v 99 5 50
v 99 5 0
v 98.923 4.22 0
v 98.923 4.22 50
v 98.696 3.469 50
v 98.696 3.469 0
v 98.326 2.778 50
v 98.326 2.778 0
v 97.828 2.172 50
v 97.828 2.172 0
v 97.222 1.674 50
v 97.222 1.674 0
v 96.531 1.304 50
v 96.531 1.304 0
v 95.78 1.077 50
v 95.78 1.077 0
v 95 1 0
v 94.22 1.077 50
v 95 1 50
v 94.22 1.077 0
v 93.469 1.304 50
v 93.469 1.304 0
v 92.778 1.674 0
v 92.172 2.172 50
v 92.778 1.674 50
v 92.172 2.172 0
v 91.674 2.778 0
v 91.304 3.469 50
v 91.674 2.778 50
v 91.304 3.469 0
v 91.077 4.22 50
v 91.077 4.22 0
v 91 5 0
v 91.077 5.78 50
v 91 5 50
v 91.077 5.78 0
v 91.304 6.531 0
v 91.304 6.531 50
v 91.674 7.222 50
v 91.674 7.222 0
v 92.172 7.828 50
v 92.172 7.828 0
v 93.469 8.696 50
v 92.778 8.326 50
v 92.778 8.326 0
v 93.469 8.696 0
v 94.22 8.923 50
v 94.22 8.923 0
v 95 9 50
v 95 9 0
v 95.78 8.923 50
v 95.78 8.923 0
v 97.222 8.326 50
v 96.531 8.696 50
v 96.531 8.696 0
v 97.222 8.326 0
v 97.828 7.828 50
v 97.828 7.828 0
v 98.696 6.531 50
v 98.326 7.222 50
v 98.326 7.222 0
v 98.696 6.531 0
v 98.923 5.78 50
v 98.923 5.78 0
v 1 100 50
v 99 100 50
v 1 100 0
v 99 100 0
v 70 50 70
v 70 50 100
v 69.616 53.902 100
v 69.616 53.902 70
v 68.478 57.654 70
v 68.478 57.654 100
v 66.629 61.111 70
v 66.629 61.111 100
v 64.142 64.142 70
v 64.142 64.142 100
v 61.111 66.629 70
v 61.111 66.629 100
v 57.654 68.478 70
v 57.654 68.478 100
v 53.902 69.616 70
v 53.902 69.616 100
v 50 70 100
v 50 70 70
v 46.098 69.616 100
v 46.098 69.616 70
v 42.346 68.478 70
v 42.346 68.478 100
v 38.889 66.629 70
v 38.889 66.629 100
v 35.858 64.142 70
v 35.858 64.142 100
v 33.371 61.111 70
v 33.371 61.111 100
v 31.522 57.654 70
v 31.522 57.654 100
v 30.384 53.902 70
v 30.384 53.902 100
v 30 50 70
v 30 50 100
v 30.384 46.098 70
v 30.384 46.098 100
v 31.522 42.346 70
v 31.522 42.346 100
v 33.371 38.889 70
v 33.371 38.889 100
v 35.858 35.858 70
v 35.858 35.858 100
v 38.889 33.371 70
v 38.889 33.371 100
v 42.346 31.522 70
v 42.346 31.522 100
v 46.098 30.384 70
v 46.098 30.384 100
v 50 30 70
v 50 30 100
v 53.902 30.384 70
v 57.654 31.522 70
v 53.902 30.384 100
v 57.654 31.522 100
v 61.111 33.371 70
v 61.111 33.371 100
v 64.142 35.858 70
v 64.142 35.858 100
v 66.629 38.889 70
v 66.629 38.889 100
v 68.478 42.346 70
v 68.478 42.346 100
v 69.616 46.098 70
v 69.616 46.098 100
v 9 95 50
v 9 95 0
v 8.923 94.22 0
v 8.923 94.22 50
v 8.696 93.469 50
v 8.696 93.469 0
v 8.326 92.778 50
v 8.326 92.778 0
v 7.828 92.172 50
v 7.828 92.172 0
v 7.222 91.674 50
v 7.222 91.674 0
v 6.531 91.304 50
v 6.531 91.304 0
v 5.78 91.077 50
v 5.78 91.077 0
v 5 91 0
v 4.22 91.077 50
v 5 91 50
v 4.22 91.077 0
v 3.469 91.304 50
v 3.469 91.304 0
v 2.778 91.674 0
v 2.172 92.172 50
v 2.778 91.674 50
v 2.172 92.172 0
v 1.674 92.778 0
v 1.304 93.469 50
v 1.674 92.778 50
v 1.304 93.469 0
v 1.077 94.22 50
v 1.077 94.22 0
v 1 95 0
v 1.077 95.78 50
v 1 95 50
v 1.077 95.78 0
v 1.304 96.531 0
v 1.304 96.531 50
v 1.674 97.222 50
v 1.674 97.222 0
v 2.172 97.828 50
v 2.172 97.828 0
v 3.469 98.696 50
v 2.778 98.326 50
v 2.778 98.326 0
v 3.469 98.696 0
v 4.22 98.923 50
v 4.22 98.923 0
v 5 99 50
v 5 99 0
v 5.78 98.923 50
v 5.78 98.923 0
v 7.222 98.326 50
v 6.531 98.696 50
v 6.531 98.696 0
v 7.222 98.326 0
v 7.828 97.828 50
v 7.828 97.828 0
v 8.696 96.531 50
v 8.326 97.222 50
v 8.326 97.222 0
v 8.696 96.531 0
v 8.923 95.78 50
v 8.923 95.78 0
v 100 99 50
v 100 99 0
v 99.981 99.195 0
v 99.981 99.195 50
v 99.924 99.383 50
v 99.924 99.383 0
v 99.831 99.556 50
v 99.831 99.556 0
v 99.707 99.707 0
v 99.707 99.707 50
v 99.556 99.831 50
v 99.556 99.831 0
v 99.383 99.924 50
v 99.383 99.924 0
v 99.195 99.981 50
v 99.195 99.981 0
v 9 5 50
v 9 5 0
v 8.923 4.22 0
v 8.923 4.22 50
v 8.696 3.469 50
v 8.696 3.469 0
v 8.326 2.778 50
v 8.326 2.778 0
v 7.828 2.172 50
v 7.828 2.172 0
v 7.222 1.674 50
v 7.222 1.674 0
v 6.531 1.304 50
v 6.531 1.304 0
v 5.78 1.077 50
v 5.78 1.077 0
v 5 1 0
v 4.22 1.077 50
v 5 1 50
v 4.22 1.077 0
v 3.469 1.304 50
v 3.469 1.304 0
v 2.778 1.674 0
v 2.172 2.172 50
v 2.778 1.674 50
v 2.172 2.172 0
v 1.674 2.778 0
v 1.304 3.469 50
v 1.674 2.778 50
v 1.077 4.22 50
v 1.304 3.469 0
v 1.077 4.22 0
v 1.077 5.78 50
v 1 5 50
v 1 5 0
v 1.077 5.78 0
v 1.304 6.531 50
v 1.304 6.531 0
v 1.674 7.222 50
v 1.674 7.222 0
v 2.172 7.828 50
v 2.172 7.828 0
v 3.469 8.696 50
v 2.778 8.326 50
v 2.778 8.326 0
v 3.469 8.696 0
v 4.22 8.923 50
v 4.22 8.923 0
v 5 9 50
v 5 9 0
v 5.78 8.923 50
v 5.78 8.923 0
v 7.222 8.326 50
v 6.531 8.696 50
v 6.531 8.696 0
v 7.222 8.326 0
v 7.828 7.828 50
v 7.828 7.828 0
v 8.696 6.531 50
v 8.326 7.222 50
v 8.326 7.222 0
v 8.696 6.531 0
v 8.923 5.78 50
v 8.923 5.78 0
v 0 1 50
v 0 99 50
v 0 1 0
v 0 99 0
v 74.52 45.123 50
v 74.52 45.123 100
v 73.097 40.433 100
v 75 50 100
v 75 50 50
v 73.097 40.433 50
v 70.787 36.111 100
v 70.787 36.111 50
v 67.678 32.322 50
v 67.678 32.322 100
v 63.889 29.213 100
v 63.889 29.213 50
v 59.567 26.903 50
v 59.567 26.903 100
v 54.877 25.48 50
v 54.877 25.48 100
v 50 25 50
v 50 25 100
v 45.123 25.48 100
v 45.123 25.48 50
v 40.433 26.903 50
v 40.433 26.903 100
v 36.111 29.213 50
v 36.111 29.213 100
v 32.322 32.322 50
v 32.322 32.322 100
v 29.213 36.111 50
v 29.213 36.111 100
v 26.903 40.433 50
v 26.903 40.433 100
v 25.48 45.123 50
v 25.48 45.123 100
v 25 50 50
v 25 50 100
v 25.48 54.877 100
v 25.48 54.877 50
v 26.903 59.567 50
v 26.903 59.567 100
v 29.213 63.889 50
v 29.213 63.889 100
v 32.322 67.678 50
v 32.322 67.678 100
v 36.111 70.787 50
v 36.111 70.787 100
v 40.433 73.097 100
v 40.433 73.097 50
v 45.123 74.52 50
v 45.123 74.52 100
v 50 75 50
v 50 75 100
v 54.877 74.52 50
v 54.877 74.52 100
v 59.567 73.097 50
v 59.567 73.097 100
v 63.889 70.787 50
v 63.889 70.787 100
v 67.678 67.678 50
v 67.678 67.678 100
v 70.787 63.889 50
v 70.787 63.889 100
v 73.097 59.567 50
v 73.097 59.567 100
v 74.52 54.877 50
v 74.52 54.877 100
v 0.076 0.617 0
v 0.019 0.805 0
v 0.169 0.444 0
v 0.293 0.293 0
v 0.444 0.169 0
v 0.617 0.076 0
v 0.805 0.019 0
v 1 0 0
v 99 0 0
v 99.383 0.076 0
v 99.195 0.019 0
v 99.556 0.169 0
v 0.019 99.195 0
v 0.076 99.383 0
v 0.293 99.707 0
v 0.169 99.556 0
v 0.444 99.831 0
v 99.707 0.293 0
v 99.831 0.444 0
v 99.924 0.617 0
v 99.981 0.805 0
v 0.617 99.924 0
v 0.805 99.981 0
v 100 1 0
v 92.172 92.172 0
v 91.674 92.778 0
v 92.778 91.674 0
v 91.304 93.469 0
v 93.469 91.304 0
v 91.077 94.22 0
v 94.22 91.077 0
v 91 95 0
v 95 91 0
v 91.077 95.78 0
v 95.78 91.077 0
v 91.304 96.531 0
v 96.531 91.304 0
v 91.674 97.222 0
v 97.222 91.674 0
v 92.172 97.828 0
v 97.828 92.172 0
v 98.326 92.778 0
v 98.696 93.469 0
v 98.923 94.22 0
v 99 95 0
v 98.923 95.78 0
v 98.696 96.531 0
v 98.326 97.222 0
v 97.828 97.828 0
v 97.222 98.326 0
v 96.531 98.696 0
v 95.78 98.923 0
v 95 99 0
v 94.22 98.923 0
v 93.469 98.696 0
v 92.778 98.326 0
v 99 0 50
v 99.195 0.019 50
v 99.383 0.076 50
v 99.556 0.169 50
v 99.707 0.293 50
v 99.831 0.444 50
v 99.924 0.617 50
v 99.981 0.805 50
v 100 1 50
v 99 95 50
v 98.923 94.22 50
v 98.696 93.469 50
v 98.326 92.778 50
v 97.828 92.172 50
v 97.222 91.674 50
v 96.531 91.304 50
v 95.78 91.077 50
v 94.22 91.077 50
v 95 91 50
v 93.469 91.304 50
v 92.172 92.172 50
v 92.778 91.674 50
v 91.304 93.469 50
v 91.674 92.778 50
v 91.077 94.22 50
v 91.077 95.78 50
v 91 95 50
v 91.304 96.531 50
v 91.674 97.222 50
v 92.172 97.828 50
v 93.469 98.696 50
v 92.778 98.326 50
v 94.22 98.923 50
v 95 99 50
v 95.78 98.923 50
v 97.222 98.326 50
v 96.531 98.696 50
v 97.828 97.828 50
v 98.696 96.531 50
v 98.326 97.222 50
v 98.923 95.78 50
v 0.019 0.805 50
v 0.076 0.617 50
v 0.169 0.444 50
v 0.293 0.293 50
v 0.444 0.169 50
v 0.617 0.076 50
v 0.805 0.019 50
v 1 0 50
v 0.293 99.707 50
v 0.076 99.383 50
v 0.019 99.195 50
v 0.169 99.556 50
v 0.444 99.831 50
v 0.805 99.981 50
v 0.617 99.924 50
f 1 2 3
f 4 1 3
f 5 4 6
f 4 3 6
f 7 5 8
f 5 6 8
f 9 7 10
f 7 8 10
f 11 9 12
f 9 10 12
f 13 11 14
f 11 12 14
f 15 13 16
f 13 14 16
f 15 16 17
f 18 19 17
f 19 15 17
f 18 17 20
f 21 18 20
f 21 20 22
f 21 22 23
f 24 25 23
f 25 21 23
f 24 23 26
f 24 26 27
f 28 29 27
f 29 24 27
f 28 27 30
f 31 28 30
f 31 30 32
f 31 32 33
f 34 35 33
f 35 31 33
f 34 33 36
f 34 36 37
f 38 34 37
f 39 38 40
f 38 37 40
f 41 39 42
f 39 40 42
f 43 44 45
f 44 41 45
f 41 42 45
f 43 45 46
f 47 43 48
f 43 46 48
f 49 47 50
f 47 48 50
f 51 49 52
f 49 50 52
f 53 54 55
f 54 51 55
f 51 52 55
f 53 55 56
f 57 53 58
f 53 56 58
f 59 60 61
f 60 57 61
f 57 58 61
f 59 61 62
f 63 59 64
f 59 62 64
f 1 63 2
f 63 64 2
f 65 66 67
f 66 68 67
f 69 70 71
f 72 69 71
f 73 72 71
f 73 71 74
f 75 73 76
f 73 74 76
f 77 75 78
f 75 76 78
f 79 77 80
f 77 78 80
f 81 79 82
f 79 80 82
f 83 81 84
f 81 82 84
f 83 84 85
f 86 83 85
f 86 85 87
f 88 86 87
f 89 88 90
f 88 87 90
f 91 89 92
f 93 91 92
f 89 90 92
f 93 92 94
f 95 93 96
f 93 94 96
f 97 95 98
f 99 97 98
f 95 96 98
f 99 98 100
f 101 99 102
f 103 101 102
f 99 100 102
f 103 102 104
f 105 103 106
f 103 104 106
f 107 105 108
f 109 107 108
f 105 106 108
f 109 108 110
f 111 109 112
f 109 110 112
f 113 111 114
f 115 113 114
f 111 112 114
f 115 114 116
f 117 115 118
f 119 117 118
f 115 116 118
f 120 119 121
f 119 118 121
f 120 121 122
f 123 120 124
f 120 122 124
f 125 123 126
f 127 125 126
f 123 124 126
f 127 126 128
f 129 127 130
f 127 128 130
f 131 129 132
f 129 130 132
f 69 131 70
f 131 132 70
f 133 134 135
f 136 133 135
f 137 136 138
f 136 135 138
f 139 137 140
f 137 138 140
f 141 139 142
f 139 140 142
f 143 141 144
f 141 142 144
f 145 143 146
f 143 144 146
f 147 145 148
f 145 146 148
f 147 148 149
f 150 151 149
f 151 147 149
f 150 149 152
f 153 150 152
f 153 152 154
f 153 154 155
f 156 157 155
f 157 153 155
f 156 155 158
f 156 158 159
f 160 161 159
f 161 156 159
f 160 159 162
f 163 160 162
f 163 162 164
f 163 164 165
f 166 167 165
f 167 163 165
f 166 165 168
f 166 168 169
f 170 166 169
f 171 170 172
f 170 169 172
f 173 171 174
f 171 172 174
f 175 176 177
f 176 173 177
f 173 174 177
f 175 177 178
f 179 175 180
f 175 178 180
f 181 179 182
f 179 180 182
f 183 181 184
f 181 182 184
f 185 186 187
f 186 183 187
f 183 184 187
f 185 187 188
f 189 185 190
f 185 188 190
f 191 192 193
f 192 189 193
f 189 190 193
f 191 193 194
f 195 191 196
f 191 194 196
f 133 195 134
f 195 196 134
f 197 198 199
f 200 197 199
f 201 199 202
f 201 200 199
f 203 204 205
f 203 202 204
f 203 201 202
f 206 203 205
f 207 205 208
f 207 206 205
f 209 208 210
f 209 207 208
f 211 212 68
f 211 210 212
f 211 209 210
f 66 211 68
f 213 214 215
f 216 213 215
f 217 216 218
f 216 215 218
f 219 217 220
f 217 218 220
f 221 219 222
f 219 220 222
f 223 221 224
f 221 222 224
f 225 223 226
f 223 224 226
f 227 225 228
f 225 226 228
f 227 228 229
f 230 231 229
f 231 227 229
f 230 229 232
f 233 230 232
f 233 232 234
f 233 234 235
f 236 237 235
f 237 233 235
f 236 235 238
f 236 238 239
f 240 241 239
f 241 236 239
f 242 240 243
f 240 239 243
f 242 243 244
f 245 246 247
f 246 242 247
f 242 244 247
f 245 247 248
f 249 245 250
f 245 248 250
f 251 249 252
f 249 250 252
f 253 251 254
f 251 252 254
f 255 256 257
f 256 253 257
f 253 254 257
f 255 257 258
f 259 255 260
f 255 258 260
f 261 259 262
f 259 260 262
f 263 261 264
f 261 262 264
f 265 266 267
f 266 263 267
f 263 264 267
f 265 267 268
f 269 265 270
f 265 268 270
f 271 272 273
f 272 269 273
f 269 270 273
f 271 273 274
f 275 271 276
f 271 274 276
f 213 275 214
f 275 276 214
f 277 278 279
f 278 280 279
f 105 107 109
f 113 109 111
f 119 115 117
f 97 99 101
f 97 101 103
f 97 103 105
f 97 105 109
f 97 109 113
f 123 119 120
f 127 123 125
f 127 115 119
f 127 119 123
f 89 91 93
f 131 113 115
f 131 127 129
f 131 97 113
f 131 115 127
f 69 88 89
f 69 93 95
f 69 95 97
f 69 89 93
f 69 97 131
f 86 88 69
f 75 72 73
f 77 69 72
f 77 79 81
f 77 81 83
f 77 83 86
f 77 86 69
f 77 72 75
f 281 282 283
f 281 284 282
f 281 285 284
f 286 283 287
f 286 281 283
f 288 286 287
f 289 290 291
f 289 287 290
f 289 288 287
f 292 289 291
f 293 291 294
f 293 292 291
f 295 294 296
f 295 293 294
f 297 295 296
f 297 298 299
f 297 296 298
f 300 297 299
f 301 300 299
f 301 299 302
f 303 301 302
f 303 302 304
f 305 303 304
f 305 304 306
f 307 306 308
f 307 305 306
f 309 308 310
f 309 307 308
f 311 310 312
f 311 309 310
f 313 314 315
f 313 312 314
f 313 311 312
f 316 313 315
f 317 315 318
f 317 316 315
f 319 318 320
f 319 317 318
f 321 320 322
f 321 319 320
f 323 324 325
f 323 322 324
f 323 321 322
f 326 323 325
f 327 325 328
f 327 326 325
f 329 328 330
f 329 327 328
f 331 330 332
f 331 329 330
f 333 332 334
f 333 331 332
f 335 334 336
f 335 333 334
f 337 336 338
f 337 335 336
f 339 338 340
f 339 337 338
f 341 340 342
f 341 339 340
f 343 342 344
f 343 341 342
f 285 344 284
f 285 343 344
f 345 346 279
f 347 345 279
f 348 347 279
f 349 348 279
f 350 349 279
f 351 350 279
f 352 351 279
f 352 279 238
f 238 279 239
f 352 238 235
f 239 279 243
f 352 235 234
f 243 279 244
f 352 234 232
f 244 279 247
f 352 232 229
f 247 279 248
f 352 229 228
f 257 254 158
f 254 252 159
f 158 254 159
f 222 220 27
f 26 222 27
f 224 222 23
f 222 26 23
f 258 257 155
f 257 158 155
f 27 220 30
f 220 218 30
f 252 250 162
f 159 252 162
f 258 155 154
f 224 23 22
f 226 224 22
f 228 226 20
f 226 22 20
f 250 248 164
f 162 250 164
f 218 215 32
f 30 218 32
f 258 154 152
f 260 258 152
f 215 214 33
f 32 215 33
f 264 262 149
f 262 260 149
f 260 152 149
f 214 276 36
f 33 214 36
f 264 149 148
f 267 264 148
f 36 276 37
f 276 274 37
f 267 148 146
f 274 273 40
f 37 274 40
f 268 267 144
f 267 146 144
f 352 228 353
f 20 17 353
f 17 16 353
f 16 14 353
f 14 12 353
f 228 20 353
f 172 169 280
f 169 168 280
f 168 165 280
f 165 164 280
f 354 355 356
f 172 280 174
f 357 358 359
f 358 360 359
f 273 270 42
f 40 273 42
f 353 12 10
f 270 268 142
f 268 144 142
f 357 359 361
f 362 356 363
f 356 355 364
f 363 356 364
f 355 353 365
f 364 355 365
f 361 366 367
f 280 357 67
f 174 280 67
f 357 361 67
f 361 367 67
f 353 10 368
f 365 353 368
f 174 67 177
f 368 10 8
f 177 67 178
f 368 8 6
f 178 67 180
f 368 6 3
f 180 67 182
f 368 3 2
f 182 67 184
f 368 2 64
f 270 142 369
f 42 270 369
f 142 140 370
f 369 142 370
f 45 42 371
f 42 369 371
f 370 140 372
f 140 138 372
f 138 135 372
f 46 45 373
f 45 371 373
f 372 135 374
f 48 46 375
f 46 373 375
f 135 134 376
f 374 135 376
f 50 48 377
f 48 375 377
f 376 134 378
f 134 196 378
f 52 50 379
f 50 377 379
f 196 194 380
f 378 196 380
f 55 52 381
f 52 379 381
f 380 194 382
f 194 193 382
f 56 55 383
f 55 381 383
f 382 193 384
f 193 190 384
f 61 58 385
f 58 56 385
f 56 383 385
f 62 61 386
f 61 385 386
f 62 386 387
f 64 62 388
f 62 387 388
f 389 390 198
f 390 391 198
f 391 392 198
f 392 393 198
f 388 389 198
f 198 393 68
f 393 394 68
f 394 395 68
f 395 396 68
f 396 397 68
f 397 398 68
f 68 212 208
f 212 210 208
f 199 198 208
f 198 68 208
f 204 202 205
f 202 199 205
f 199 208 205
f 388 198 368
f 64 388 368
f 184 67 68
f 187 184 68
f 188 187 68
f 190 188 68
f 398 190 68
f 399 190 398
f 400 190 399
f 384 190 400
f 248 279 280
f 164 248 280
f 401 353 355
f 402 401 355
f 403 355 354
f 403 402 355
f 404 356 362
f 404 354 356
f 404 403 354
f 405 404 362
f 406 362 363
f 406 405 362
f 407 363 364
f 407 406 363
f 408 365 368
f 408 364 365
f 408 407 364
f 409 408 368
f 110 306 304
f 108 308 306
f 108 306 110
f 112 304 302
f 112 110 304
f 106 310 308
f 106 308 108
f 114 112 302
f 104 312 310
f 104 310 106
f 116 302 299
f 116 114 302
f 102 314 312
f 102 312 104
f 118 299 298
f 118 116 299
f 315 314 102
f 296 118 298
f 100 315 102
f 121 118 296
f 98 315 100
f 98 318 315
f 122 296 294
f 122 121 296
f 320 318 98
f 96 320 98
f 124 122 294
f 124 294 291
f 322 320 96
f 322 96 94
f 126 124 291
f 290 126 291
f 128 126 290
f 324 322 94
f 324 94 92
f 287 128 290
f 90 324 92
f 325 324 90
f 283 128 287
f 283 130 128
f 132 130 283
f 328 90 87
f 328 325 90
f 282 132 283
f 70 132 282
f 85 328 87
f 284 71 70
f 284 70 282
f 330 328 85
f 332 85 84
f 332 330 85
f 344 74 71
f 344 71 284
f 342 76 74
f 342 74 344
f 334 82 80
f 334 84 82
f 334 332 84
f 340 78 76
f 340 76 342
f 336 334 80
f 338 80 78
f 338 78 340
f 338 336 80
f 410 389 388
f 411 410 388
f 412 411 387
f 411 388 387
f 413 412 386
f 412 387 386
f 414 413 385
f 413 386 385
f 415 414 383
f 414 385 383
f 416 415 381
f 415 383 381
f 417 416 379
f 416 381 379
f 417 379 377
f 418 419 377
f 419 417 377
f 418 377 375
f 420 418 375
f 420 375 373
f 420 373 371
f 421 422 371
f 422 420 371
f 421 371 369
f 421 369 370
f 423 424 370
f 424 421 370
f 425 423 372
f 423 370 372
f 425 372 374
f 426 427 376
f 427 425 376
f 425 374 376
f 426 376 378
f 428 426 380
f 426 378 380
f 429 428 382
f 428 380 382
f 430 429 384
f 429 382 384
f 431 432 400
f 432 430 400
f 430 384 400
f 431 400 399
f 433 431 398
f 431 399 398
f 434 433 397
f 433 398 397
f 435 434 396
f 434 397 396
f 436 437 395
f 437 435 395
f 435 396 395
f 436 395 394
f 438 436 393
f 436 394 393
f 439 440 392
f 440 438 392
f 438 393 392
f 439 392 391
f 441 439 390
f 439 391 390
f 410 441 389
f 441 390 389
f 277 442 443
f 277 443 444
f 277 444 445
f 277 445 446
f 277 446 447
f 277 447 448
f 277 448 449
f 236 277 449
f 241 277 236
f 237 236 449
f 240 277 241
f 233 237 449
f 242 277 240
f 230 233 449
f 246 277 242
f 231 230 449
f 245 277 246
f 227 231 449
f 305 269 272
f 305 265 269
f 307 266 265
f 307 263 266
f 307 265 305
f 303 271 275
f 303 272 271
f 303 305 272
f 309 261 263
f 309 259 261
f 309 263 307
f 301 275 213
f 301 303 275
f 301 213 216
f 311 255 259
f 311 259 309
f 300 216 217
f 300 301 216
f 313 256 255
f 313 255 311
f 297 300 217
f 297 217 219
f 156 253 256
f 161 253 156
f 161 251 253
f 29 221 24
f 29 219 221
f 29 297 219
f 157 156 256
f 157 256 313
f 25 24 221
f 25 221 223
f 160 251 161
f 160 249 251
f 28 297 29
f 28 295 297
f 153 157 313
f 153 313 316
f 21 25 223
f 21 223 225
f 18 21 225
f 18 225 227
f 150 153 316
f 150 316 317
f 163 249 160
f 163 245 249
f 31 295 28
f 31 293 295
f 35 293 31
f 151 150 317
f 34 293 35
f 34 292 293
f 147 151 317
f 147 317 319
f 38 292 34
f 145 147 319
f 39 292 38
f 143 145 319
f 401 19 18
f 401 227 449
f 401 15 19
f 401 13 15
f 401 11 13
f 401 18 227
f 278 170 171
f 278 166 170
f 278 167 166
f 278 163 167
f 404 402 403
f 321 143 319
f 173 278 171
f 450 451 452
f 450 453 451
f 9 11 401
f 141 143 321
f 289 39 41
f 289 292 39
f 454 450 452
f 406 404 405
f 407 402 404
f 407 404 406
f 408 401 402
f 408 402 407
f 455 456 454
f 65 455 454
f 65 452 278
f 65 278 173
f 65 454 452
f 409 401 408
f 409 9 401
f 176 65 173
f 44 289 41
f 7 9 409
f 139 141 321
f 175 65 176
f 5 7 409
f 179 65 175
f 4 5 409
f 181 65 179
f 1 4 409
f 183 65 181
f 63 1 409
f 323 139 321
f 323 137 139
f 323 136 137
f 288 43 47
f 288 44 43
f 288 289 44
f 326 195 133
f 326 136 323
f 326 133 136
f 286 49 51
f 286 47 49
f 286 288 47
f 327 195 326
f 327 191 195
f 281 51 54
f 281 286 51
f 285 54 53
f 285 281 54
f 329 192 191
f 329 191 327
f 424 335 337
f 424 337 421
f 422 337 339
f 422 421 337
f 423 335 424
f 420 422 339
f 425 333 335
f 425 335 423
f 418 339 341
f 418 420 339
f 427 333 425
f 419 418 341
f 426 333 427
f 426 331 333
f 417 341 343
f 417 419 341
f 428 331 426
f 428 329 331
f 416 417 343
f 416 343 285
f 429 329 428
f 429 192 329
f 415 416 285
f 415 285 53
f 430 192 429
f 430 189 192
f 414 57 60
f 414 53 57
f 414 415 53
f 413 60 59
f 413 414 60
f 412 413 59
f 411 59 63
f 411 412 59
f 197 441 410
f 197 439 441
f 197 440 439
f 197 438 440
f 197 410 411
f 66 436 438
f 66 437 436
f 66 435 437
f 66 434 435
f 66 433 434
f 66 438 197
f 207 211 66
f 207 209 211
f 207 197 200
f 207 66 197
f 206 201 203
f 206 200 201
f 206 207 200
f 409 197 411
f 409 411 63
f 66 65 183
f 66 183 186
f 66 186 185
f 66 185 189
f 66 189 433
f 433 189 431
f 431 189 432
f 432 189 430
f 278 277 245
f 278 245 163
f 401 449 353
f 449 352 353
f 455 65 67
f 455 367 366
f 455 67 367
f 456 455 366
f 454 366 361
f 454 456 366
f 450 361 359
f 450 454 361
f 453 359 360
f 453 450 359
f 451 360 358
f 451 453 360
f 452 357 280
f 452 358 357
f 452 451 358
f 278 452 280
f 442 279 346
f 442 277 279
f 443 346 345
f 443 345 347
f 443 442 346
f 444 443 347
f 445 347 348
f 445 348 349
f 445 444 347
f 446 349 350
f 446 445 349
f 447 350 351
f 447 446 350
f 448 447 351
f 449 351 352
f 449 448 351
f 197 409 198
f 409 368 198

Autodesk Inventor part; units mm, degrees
ref_plane "YZ Plane" through (0, 0, 0) normal (1, 0, 0) x (0, 1, 0)
ref_plane "XZ Plane" through (0, 0, 0) normal (0, 1, 0) x (-1, 0, 0)
ref_plane "XY Plane" through (0, 0, 0) normal (0, 0, 1) x (1, 0, 0)
sketch "Boceto1" plane through (0, 0, 0) normal (0, 0, 1) x (1, 0, 0)
  line L0 (0, 0) -> (100, 0)
  line L1 (100, 0) -> (100, 100)
  line L2 (100, 100) -> (0, 100)
  line L3 (0, 100) -> (0, 0)
  line L4 (0, 100) -> (5, 100)
  circle A0 centre (5, 95) radius 4
  line L5 (0, 0) -> (0, 5)
  circle A1 centre (5, 5) radius 4
  line L6 (100, 0) -> (100, 5)
  circle A2 centre (95, 5) radius 4
  line L7 (100, 100) -> (95, 100)
  circle A3 centre (95, 95) radius 4
  line L8 (0, 100) -> (50, 100)
  line L9 (50, 100) -> (50, 50)
  dimension "d6" = 100
  dimension "d7" = 100
  dimension "d10" = 8
  dimension "d20" = 50
  dimension "d21" = 50
extrude "Extrusión1" add sketch "Boceto1" along normal blind 50
fillet "Empalme1" radius 1 4 edges at (100, 0, 25) (0, 0, 25) (100, 100, 25) (0, 100, 25)
sketch "Boceto2" plane through (0, 0, 50) normal (0, 0, 1) x (1, 0, 0)
  circle A0 centre (50, 50) radius 25
  point P0 (0, 0)
  dimension "d27" = 50
extrude "Extrusión2" add sketch "Boceto2" along normal blind 50
sketch "Boceto3" plane through (50, 50, 100) normal (0, 0, 1) x (1, 0, 0)
  circle A0 centre (0, 0) radius 20
  point P0 (-50, -50)
  dimension "d30" = 40
extrude "Extrusión3" cut sketch "Boceto3" against normal blind 30
thread "Rosca1" size "M40x3" class "6H" standard "ANSI Metric M Profile" length 30
properties part number "Tarea 1 Joel Monroy Lab Din"
